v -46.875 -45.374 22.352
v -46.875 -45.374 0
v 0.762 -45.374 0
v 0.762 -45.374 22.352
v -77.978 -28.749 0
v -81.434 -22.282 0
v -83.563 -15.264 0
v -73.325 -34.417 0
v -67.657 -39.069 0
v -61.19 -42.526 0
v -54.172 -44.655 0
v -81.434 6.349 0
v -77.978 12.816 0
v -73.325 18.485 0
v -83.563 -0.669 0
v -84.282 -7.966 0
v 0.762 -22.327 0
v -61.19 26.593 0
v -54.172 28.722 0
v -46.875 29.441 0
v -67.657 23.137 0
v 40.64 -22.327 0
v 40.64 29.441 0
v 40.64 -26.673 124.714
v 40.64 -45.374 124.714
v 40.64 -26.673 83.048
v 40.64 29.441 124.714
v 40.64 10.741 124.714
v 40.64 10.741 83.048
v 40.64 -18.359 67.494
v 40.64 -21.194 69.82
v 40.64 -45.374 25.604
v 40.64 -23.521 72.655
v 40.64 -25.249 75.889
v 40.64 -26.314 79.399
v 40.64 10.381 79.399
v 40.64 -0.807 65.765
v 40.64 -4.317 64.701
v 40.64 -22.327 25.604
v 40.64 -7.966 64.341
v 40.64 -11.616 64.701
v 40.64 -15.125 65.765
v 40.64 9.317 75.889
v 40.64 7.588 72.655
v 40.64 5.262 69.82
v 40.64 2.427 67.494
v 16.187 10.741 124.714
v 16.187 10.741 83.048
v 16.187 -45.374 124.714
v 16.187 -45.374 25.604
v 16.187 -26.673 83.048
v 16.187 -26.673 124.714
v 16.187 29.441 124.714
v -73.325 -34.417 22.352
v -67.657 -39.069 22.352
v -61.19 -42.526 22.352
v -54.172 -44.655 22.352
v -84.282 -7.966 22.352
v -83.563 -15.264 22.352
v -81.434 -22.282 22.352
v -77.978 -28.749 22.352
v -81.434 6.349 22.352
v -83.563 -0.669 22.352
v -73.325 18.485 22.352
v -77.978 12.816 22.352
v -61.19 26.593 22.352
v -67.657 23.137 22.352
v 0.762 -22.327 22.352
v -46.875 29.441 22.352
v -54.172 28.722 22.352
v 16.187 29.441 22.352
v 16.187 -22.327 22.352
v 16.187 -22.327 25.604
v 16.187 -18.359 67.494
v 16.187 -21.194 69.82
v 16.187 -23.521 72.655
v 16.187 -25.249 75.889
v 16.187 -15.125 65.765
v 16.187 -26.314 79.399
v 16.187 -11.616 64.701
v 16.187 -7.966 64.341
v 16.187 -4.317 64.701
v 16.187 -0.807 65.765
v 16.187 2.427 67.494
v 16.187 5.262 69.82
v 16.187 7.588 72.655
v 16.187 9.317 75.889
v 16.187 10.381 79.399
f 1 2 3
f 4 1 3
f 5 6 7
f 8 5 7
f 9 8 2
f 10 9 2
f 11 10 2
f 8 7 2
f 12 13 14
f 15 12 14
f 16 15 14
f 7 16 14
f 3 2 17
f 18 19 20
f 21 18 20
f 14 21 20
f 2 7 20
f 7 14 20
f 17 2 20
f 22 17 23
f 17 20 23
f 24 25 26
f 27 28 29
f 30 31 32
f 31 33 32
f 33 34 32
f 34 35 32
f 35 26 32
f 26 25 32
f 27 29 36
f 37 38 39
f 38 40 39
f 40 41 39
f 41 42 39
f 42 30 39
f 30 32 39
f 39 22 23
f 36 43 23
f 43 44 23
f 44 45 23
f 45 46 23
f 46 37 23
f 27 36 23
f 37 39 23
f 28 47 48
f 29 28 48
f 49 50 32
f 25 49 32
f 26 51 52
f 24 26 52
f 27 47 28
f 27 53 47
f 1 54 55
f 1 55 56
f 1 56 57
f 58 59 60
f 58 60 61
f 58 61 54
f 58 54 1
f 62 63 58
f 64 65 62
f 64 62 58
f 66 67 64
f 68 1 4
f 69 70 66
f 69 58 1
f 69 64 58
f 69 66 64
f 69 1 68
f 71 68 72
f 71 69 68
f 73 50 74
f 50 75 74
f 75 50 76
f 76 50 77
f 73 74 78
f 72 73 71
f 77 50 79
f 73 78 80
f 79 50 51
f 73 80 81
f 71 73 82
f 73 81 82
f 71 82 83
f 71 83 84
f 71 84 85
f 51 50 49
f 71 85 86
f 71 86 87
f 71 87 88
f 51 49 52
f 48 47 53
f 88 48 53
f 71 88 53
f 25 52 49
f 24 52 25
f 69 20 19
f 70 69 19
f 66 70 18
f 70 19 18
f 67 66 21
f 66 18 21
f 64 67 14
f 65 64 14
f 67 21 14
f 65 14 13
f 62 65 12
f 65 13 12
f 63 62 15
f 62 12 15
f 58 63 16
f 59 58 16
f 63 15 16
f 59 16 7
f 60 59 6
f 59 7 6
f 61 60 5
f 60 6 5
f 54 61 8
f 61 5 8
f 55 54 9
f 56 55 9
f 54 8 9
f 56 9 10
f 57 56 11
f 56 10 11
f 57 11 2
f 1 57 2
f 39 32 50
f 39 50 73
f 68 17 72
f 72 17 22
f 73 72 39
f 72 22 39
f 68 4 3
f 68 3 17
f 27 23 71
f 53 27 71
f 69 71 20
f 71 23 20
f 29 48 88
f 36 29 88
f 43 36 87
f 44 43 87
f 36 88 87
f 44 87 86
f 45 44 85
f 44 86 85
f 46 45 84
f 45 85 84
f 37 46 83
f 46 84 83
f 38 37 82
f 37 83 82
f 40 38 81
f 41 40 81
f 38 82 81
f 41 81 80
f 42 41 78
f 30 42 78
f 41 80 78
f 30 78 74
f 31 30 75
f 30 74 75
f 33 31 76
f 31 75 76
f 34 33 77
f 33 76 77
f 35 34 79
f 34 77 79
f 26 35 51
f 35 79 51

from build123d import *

# Parameters (mm, degrees)
F1_DEPTH = 124.714
F3_DEPTH = 102.362
F5_DEPTH = 25.4
F6_W     = 23.046266
F6_H     = 25.604162
F7_DEPTH = 39.878


with BuildPart() as f1:
    # F0 (on Top) → F1 (new body)
    with BuildSketch(Plane.XY):
        with BuildLine():
            Line((40.64, 29.44091), (-46.874546, 29.44091))
            ThreePointArc((-46.874546, 29.44091), (-84.281819, -7.966364), (-46.874546, -45.373637))
            Line((-46.874546, -45.373637), (40.64, -45.373637))
            Line((40.64, -45.373637), (40.64, 29.44091))
        make_face()
    extrude(amount=F1_DEPTH)

    # F2 (on face) → F3 (cut)
    with BuildSketch(Plane.XY.offset(124.714)):
        with BuildLine():
            Line((16.18675, -45.373637), (16.18675, 29.44091))
            Line((16.18675, 29.44091), (-46.874546, 29.44091))
            ThreePointArc((-46.874546, 29.44091), (-84.281819, -7.966364), (-46.874546, -45.373637))
            Line((-46.874546, -45.373637), (16.18675, -45.373637))
        make_face()
    extrude(amount=-F3_DEPTH, mode=Mode.SUBTRACT)

    # F4 (on face) → F5 (cut)
    with BuildSketch(Plane(origin=(16.18675, 0, 0), x_dir=(0, -1, 0), z_dir=(-1, 0, 0))):
        with BuildLine():
            Line((26.673464, 124.714), (-10.740736, 124.714))
            Line((-10.740736, 124.714), (-10.740736, 83.048187))
            ThreePointArc((-10.740736, 83.048187), (7.966364, 64.341087), (26.673464, 83.048187))
            Line((26.673464, 83.048187), (26.673464, 124.714))
        make_face()
    extrude(amount=-F5_DEPTH, mode=Mode.SUBTRACT)

    # F6 (on face) → F7 (cut)
    with BuildSketch(Plane.YZ.offset(40.64)):
        with Locations((-33.850504, 12.802081)):
            Rectangle(F6_W, F6_H)
    extrude(amount=-F7_DEPTH, mode=Mode.SUBTRACT)


solid = f1.part
